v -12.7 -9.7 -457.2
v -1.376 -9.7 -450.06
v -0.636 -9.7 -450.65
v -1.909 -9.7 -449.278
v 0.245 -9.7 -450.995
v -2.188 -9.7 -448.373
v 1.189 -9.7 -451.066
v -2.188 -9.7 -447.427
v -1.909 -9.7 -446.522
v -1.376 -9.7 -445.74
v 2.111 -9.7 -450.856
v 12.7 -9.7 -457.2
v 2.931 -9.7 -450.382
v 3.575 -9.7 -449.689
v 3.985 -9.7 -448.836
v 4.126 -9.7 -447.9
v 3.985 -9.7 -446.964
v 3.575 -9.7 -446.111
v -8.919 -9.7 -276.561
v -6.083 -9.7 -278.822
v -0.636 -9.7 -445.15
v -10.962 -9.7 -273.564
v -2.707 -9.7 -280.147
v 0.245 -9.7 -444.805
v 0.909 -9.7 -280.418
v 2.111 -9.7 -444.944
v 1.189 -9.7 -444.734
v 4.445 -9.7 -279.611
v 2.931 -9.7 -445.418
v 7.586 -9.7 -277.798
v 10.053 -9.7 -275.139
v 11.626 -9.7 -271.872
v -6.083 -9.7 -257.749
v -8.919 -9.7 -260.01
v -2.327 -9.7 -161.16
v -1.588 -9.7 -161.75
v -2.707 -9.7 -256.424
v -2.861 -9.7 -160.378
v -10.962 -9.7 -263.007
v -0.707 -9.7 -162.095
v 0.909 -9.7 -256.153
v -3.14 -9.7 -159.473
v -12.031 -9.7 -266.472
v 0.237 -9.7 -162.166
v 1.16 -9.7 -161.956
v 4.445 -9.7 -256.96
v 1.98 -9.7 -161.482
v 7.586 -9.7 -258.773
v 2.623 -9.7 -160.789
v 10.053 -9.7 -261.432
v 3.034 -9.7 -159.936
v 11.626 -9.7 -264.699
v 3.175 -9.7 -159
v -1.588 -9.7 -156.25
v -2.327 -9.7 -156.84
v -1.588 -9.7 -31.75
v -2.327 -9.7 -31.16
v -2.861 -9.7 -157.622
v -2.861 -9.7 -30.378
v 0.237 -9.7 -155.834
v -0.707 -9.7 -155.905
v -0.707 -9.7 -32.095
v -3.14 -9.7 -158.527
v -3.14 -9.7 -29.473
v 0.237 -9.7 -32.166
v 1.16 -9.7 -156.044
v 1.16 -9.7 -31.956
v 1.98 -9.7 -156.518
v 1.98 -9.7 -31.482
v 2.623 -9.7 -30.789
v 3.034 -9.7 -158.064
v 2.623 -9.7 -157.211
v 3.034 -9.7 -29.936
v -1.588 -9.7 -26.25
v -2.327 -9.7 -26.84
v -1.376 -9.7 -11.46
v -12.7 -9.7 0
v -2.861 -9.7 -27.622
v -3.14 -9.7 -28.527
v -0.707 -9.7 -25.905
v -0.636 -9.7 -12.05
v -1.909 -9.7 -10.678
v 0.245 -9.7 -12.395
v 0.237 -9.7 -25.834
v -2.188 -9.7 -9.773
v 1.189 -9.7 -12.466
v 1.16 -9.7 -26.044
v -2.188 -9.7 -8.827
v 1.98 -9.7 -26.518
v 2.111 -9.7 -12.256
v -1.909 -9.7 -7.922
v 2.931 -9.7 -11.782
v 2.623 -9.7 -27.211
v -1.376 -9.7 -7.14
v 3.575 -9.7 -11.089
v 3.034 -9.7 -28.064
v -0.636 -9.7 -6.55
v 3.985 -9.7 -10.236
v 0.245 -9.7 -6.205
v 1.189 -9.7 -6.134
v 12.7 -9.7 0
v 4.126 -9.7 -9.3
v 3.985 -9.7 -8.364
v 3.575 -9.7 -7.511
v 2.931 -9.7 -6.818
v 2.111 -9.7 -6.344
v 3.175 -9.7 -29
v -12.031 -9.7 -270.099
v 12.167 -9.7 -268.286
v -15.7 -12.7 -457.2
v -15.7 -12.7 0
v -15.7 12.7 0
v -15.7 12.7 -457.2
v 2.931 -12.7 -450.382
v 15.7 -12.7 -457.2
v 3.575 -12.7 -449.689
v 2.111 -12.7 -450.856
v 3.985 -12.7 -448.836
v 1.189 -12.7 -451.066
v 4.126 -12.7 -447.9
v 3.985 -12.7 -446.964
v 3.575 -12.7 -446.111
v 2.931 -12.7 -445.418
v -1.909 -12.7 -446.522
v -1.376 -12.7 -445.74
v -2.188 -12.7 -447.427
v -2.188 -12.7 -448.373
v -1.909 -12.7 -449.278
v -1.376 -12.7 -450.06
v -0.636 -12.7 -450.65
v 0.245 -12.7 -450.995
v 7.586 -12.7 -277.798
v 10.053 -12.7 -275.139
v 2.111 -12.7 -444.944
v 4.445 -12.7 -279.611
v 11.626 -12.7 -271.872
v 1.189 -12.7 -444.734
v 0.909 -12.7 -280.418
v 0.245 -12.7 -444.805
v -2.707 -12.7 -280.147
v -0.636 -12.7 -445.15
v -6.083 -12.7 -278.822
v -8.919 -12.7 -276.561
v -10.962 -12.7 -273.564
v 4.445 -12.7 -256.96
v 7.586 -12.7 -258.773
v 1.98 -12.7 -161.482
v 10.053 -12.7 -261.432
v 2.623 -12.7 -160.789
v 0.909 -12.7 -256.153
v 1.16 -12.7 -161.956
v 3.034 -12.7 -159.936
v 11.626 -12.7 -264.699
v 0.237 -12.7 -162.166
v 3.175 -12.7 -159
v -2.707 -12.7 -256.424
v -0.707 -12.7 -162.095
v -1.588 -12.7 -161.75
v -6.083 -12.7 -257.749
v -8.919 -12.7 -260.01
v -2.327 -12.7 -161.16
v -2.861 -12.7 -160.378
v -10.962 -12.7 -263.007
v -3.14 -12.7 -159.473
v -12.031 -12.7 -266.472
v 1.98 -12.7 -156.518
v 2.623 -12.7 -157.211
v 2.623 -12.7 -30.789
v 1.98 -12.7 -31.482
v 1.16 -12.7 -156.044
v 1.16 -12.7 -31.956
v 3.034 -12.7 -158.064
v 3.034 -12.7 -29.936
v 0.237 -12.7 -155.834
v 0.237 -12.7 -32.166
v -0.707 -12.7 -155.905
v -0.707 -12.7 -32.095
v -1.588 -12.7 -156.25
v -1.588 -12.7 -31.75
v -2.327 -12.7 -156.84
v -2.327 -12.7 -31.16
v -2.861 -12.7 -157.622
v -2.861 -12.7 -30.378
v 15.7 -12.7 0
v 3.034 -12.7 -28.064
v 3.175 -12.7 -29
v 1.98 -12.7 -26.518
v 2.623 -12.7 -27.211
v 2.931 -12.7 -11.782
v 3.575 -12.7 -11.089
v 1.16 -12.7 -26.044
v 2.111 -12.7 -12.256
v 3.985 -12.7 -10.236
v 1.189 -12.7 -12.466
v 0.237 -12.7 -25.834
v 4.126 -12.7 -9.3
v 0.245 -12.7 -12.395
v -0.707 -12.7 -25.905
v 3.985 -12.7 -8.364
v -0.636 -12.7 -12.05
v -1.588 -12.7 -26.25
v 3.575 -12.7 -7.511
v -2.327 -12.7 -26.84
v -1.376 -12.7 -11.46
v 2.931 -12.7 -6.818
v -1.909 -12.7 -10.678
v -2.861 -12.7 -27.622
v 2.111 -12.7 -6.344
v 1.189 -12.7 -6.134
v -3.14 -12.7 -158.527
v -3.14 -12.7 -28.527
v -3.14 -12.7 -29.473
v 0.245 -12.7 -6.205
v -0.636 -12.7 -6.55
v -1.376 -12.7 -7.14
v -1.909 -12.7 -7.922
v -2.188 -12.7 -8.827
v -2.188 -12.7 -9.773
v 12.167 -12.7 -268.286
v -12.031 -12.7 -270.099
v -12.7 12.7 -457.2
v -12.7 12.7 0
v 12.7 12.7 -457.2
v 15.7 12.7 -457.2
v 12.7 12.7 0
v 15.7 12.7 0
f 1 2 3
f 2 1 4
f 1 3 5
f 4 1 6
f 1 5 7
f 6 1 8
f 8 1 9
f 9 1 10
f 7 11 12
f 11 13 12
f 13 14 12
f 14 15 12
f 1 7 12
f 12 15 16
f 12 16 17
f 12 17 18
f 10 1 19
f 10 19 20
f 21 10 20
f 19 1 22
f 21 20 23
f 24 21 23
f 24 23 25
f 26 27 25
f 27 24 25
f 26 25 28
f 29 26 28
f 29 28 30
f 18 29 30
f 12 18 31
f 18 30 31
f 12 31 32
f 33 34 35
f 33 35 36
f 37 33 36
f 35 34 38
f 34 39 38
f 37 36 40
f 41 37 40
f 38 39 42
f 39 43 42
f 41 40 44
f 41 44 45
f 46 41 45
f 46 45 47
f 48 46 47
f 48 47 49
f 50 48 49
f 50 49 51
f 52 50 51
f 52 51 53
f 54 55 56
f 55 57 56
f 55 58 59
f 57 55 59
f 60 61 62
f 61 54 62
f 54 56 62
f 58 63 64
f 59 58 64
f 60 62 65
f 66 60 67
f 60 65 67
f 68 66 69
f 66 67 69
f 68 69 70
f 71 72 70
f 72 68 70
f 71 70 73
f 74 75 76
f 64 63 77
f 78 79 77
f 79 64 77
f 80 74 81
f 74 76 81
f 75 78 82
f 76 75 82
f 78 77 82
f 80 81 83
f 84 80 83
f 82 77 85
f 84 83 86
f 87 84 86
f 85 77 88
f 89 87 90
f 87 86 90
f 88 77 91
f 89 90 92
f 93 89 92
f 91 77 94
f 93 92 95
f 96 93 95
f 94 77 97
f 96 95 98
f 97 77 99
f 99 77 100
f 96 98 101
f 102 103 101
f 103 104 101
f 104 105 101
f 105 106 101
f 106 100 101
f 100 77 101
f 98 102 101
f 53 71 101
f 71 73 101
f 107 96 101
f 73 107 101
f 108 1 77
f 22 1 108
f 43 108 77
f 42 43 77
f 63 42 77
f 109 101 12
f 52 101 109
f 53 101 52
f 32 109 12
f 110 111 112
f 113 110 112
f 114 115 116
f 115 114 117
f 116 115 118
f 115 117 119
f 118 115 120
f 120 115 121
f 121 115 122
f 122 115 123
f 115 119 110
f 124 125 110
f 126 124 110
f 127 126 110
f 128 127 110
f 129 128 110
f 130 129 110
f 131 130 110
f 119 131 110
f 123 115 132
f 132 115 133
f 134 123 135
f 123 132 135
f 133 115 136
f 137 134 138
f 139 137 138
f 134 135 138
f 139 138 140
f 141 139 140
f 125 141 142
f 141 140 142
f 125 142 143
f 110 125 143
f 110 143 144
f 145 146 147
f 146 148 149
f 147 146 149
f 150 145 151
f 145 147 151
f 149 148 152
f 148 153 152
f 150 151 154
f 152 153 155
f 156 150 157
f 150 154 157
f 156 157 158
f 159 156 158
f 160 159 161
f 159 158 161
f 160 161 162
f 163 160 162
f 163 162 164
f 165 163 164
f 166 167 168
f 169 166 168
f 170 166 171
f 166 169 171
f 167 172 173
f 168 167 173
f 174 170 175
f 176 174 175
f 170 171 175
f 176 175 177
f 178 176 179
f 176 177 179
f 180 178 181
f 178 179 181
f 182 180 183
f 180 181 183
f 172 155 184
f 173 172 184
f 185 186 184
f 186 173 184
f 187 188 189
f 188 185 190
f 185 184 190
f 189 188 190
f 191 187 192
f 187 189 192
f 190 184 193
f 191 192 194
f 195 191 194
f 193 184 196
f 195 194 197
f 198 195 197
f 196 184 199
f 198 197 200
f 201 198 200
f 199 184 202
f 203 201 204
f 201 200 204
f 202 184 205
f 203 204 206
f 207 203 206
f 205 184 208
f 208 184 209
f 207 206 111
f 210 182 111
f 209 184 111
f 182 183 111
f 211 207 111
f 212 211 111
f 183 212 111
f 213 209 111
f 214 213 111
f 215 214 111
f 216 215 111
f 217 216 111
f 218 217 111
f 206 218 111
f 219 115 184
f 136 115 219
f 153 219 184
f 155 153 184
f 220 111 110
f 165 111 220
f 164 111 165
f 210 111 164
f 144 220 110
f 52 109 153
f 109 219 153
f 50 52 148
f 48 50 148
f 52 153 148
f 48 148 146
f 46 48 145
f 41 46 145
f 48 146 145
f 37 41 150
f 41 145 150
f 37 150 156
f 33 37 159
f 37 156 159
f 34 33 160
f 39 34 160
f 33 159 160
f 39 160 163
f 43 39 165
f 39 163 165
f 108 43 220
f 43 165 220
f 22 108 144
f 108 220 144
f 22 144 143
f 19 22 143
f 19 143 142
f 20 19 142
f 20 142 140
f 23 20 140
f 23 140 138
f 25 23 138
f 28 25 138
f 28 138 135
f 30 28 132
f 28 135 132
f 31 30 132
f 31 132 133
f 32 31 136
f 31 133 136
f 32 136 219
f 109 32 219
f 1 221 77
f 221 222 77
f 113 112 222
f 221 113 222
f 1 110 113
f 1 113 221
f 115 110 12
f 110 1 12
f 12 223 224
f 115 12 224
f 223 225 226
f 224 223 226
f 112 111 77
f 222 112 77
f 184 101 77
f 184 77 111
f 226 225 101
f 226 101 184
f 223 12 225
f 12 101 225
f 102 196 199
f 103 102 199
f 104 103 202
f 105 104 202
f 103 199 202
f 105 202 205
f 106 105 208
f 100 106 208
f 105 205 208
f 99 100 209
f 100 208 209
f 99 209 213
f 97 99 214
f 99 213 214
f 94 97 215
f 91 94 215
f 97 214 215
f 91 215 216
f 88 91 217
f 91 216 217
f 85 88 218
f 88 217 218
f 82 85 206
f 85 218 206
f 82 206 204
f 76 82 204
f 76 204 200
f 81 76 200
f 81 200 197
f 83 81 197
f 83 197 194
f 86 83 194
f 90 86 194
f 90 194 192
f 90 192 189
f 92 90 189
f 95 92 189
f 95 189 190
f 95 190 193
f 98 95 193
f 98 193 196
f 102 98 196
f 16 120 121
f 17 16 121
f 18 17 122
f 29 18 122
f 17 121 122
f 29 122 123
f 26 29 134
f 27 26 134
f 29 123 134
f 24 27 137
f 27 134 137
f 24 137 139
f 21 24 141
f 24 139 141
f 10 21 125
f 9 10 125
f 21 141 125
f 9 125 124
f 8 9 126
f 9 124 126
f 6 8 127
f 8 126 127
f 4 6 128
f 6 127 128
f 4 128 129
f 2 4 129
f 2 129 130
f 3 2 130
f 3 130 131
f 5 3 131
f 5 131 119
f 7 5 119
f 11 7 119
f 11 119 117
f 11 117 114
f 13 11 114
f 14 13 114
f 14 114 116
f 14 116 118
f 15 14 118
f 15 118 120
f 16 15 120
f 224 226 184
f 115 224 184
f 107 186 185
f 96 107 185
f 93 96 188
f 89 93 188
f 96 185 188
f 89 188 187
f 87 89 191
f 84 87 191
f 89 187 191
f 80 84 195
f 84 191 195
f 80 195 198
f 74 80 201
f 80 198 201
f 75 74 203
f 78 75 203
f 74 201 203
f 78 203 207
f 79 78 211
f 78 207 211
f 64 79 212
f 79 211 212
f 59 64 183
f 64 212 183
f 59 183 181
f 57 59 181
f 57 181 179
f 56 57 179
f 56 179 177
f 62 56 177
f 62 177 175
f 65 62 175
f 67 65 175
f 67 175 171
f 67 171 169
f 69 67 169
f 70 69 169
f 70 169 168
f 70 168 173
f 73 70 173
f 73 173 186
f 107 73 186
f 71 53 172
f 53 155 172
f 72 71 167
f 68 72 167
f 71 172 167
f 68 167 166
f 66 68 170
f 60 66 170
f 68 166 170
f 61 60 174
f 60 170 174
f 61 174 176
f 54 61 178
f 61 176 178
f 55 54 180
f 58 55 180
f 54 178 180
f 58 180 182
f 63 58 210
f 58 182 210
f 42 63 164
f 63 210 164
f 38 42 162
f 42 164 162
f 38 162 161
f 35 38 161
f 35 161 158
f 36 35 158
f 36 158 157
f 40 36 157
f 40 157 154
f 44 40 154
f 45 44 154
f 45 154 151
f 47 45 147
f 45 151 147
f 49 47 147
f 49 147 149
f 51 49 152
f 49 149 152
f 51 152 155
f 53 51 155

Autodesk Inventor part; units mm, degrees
ref_plane "YZ Plane" through (0, 0, 0) normal (1, 0, 0) x (0, 1, 0)
ref_plane "XZ Plane" through (0, 0, 0) normal (0, 1, 0) x (-1, 0, 0)
ref_plane "XY Plane" through (0, 0, 0) normal (0, 0, 1) x (1, 0, 0)
sketch "Sketch1" plane through (0, 0, 0) normal (0, 0, 1) x (1, 0, 0)
  line L0 (-15.7, 12.7) -> (-12.7, 12.7)
  line L1 (-12.7, 12.7) -> (-12.7, -9.7)
  line L2 (-12.7, -9.7) -> (12.7, -9.7)
  line L3 (12.7, -9.7) -> (12.7, 12.7)
  line L4 (12.7, 12.7) -> (15.7, 12.7)
  line L5 (15.7, 12.7) -> (15.7, -12.7)
  line L6 (15.7, -12.7) -> (-15.7, -12.7)
  line L7 (-15.7, -12.7) -> (-15.7, 12.7)
  point P0 (0, 0)
  dimension "d0" = 3
  dimension "d2" = 3
  dimension "d3" = 25.4
  dimension "d4" = 31.4
  dimension "d5" = 15.7
  dimension "d7" = 12.7
  dimension "d8" = 3
extrude "Extrusion1" add sketch "Sketch1" against normal blind 457.2
sketch "Sketch6" plane through (-15.7, -12.7, 0) normal (0, -1, 0) x (1, 0, 0)
  circle A0 centre (16.6513, -447.9) radius 3.175
  point P0 (15.7, 0)
  dimension "d21" = 6.35
extrude "Extrusion4" cut sketch "Sketch6" against normal blind 10
sketch "Sketch7" plane through (-15.7, -12.7, 0) normal (0, -1, 0) x (1, 0, 0)
  line L0 (31.4, -134) -> (0, -134) construction
  line L1 (31.4, -184) -> (0, -184) construction
  line L2 (0, -184) -> (0, -134) construction
  line L3 (0, -159) -> (15.7, -159) construction
  line L4 (15.7, -159) -> (15.7, -184) construction
  circle A0 centre (15.7, -159) radius 3.175
  point P0 (15.7, 0)
  dimension "d25" = 6.35
extrude "Extrusion5" cut sketch "Sketch7" against normal blind 10
sketch "Sketch8" plane through (-15.7, -12.7, 0) normal (0, -1, 0) x (1, 0, 0)
  circle A0 centre (16.6513, -9.3) radius 3.175
  circle A1 centre (15.7, -29) radius 3.175
  circle A2 centre (16.6513, -9.3) radius 3.175
  circle A3 centre (15.7, -29) radius 3.175
  circle A4 centre (15.7, -159) radius 3.175
  circle A5 centre (16.6513, -447.9) radius 3.175
  line L0 (31.4, 0) -> (0, 0)
  line L1 (0, 0) -> (0, -457.2)
  line L2 (31.4, -457.2) -> (0, -457.2)
  line L3 (31.4, 0) -> (31.4, -457.2)
  circle A6 centre (15.7, -268.2855) radius 12.1666
  point P0 (15.7, 0)
  point P1 (15.7, 0)
  dimension "d33" = 188.9145
  dimension "d34" = 15.7
  dimension "d35" = 31.4
extrude "Extrusion6" cut sketch "Sketch8" against normal blind 10 contours A0 | A1 | A6
equation "\"d2\" = d0"
equation "\"d5\" = 0.5 * d4"
equation "\"d7\" = 0.5 * d3"
equation "\"d8\" = d0"
equation "\"d34\" = 0.5 * d35"
properties part number "18in C-Channel Rear" material "Aluminum 6061"
